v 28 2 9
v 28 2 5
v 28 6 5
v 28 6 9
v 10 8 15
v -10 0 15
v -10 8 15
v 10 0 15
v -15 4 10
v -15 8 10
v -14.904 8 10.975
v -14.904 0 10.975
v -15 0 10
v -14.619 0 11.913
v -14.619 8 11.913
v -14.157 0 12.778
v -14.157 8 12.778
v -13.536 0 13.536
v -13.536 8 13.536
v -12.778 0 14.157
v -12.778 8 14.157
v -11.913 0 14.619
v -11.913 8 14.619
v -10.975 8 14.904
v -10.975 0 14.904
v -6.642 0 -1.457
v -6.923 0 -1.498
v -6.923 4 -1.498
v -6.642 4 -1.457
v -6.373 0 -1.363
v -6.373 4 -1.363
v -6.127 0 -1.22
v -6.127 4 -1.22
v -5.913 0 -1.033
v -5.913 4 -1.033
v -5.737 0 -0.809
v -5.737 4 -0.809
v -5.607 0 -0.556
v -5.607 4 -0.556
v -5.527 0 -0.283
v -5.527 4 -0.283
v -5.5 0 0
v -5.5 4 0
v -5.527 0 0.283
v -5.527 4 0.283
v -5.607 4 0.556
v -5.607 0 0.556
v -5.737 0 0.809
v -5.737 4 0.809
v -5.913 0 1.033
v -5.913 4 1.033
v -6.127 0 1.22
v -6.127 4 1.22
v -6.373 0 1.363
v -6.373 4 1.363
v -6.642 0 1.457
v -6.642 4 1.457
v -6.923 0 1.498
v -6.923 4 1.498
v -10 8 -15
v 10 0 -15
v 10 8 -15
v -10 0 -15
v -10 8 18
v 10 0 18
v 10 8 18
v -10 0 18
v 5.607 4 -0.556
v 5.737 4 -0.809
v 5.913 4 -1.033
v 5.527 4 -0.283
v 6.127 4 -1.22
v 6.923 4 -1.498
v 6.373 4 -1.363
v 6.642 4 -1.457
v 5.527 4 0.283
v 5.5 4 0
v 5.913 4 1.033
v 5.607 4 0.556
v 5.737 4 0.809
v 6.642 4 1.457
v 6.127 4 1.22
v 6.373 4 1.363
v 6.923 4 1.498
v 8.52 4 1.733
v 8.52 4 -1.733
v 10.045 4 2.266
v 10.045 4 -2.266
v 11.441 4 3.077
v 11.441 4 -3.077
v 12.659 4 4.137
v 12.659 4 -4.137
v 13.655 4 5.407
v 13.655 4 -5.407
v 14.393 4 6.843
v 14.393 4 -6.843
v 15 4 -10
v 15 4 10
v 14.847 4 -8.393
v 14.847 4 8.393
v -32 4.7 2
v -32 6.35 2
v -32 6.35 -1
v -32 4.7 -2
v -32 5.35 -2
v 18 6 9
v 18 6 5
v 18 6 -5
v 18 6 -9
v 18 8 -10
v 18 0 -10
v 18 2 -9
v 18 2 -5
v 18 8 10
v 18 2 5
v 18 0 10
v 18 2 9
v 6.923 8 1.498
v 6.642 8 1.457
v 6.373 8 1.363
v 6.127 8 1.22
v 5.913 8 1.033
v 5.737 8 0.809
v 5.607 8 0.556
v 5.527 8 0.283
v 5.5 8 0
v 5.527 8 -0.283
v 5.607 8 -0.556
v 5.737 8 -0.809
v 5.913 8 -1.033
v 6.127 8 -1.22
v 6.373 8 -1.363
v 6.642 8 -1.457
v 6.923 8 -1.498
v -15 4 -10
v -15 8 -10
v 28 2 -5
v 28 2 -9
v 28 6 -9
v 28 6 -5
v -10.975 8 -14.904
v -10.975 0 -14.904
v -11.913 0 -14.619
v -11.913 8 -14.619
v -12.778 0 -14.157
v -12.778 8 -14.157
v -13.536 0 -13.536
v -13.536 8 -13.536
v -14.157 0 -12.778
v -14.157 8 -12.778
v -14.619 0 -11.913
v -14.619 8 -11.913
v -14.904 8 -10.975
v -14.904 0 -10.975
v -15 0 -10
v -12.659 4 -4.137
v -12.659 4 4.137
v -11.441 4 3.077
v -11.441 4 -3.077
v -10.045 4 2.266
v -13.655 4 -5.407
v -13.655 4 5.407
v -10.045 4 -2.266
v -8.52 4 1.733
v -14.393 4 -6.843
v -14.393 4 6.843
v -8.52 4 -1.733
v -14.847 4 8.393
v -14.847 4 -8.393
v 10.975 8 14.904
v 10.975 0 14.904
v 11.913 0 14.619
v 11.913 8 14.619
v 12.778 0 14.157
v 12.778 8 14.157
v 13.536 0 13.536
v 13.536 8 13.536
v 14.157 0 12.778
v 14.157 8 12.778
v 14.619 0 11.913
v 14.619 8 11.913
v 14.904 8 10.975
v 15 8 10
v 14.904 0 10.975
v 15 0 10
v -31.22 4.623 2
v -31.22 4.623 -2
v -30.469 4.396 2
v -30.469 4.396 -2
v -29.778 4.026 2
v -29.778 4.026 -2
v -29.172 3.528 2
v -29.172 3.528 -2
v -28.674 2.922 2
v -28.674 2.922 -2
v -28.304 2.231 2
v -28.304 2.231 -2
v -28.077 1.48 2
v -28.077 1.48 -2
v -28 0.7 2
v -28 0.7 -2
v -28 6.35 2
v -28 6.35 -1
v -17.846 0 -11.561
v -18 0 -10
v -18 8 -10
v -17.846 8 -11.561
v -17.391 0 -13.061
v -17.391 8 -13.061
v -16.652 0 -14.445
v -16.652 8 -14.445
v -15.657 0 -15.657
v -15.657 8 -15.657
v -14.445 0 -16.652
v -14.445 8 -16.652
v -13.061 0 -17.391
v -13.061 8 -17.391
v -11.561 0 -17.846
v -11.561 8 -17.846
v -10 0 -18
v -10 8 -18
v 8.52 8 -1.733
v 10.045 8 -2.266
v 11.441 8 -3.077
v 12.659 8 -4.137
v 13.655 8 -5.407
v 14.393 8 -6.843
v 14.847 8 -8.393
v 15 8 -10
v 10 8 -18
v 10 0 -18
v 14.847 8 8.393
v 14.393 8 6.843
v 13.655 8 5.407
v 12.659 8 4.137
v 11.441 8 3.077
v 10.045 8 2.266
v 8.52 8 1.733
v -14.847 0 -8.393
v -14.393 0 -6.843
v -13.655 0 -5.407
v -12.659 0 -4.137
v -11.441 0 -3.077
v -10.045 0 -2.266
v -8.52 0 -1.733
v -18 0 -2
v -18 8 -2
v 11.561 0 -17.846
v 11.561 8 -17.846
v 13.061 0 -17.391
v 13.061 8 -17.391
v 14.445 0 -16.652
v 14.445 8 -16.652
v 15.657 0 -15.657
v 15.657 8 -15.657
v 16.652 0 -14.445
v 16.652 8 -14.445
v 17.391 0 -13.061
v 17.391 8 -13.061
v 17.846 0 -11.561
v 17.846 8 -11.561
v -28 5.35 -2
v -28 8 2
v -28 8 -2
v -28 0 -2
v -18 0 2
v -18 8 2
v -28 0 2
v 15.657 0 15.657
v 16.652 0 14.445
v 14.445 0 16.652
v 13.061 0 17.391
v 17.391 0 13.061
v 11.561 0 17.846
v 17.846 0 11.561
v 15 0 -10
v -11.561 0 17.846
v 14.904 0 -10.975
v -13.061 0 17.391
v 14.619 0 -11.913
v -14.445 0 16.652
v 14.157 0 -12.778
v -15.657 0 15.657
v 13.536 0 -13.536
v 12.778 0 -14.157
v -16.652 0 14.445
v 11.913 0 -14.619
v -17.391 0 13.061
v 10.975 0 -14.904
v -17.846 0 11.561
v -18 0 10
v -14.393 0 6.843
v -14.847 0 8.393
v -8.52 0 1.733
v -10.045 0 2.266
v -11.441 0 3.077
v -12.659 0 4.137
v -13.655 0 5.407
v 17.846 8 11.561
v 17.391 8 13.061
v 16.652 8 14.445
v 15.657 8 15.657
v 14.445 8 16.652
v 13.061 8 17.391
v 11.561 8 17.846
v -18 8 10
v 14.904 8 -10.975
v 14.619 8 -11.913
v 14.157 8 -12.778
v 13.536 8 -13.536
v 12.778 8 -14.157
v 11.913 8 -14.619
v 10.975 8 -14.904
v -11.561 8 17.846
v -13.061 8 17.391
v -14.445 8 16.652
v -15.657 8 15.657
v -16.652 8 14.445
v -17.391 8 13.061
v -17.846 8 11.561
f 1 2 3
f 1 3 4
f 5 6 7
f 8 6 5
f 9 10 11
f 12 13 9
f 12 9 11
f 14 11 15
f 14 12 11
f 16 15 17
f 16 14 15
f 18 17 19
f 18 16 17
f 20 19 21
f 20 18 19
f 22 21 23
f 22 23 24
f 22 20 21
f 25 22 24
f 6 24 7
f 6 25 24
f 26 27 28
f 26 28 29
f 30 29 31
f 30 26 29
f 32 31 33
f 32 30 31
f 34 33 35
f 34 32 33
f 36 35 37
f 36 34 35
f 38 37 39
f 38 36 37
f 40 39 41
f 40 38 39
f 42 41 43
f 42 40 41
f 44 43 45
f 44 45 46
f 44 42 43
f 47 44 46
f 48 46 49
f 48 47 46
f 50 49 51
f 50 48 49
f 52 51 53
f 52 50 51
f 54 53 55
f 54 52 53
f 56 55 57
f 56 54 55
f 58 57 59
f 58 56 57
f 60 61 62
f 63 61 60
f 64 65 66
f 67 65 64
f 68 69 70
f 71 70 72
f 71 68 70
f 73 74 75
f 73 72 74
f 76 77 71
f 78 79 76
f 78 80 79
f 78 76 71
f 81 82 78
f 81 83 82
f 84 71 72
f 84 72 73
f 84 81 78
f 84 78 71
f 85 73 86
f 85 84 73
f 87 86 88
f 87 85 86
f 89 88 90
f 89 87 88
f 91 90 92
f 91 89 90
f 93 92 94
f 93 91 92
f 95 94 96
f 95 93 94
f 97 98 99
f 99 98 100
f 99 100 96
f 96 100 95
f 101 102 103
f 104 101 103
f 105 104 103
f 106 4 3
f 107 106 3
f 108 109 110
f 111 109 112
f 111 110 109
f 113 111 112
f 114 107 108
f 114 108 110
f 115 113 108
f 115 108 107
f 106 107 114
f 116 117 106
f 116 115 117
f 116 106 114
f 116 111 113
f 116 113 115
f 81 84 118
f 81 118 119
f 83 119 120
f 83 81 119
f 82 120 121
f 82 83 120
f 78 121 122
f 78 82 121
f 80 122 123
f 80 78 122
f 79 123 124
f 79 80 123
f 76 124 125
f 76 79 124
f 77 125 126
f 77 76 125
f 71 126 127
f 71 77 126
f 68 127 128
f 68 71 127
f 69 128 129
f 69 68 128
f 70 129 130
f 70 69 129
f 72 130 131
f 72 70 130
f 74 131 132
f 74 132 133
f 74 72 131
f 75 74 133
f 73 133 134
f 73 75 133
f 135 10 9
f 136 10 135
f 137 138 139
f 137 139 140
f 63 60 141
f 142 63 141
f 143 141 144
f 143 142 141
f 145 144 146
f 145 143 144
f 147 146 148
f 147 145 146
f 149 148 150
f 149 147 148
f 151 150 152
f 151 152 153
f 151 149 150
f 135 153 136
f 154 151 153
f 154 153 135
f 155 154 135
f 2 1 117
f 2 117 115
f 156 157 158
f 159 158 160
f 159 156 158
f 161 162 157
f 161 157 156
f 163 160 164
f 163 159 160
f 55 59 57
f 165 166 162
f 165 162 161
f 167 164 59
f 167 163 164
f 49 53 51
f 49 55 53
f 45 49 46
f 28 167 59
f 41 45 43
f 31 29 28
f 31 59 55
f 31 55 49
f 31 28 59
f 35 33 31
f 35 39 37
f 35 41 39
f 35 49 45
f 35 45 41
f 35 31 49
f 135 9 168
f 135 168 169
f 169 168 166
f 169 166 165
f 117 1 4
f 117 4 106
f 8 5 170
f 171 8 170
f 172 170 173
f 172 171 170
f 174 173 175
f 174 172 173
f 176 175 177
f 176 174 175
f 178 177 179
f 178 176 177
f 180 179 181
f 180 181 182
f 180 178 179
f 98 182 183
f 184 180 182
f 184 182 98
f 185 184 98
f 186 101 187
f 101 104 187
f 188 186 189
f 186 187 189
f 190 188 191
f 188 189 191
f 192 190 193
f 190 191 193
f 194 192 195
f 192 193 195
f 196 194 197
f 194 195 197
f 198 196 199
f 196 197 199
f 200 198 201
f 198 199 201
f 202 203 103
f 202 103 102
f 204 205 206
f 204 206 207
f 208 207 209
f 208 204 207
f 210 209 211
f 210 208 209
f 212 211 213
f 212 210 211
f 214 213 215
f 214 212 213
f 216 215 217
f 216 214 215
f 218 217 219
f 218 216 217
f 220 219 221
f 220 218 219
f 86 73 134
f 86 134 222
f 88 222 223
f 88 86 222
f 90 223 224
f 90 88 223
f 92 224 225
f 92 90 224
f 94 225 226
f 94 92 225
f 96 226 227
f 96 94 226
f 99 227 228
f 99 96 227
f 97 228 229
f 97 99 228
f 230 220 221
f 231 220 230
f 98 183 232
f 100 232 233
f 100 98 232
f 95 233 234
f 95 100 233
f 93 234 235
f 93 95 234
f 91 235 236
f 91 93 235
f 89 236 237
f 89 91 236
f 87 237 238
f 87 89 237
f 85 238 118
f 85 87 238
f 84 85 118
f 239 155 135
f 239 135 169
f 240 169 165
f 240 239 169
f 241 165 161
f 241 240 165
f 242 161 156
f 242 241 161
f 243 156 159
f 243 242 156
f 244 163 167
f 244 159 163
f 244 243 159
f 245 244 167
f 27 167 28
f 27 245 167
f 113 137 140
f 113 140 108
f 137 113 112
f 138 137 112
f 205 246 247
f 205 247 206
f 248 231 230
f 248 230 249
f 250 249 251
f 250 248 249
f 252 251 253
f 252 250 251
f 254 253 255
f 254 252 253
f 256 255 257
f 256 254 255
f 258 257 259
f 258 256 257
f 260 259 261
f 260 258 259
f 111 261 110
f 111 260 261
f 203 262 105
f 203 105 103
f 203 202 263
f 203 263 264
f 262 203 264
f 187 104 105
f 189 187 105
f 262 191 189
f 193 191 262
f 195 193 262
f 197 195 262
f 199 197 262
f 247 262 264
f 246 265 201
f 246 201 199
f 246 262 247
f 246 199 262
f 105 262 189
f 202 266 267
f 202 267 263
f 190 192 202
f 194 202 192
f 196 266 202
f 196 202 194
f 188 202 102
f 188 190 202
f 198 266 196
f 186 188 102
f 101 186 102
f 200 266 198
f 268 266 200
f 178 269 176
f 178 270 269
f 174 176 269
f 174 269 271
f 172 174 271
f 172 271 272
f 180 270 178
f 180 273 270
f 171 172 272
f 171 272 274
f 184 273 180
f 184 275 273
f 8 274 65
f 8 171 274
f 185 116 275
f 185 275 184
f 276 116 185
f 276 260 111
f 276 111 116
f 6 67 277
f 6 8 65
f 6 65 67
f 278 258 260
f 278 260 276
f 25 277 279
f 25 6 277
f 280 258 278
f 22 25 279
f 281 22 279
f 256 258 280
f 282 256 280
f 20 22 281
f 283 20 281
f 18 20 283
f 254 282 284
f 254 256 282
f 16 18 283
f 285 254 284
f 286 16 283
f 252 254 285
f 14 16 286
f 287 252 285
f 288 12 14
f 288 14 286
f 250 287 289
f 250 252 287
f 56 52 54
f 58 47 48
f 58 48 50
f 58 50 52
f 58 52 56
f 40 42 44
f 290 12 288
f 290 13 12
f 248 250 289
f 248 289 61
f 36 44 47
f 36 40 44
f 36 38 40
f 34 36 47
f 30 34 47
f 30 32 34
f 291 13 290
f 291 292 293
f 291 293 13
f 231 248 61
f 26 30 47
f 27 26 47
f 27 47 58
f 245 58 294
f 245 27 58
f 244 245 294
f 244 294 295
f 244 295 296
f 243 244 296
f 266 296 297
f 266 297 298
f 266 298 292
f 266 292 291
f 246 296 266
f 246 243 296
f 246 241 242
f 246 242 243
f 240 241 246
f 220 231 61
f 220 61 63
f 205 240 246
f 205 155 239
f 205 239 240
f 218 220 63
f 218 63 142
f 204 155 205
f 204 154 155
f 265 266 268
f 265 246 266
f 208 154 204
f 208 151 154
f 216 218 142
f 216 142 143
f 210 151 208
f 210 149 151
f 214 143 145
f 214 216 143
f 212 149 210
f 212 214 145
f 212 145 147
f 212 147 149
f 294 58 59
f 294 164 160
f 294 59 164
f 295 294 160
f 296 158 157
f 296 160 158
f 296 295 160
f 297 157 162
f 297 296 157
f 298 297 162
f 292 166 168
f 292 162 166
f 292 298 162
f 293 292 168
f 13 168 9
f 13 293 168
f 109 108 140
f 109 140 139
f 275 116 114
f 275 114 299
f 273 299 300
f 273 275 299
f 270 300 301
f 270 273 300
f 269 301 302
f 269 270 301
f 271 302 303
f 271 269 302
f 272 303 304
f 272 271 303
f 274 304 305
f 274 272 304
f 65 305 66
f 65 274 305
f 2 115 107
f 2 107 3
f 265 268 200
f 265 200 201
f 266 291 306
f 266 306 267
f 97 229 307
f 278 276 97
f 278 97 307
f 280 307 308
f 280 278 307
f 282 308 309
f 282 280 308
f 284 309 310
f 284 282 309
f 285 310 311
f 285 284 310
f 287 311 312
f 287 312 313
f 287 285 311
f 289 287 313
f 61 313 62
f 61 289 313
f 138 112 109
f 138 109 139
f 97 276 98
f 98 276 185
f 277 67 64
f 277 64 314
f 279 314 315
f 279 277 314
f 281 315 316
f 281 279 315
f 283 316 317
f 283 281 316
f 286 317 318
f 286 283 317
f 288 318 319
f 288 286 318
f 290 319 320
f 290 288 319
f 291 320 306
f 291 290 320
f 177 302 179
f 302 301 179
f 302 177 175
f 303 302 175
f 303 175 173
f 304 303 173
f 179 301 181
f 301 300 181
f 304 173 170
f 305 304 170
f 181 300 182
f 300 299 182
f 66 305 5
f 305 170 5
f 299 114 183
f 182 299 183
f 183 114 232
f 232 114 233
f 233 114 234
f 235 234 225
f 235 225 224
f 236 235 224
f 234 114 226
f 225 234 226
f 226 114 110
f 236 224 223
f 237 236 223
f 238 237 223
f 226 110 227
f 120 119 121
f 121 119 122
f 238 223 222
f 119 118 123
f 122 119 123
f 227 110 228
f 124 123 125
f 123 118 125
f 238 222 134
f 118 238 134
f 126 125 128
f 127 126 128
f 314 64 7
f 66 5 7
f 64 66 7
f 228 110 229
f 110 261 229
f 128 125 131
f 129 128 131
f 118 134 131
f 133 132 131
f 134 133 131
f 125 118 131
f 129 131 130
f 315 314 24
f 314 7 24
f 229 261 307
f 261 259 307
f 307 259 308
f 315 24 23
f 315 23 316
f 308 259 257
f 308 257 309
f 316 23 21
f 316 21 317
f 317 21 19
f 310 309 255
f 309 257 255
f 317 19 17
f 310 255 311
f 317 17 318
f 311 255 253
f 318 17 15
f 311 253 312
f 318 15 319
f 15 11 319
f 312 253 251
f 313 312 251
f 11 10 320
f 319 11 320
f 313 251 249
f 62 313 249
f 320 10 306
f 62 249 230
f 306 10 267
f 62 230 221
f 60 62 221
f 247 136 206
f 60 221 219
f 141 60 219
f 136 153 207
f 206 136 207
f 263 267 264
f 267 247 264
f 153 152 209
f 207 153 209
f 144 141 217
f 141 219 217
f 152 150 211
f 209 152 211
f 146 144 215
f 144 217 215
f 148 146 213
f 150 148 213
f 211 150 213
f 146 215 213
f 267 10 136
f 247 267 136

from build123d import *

# Parameters (mm, degrees)
BOSS_EXTRUDE1_DEPTH = 8
BOSS_EXTRUDE2_DEPTH = 4
SKETCH3_W           = 18
SKETCH3_H           = 2
CUT_EXTRUDE1_DEPTH  = 10
FILLET1_R           = 4
SKETCH4_W           = 9.5
SKETCH4_H           = 20
CUT_EXTRUDE2_DEPTH  = 4
SKETCH5_W           = 9.5
SKETCH5_H           = 20
CUT_EXTRUDE3_DEPTH  = 4


with BuildPart() as part:
    # Sketch1 → Boss-Extrude1 (new body)
    with BuildSketch(Plane(origin=(0, 0, 0), x_dir=(1, 0, 0), z_dir=(0, 1, 0))):
        with BuildLine():
            Line((-18, -10), (-18, -2))
            Line((-18, -2), (-28, -2))
            Line((-28, -2), (-28, 2))
            Line((-28, 2), (-18, 2))
            Line((-18, 2), (-18, 10))
            ThreePointArc((-18, 10), (-15.656854249, 15.656854249), (-10, 18))
            Line((-10, 18), (10, 18))
            ThreePointArc((10, 18), (15.656854249, 15.656854249), (18, 10))
            Line((18, 10), (18, 9))
            Line((18, 9), (28, 9))
            Line((28, 9), (28, 5))
            Line((28, 5), (18, 5))
            Line((18, 5), (18, -5))
            Line((18, -5), (28, -5))
            Line((28, -5), (28, -9))
            Line((28, -9), (18, -9))
            Line((18, -9), (18, -10))
            ThreePointArc((18, -10), (15.656854249, -15.656854249), (10, -18))
            Line((10, -18), (-10, -18))
            ThreePointArc((-10, -18), (-15.656854249, -15.656854249), (-18, -10))
        make_face()
        with BuildLine():
            Line((-10, -15), (10, -15))
            ThreePointArc((10, -15), (13.535533906, -13.535533906), (15, -10))
            ThreePointArc((15, -10), (12.658876757, -4.136567081), (6.923127464, -1.498028909))
            ThreePointArc((6.923127464, -1.498028909), (5.5, 0), (6.923127464, 1.498028909))
            ThreePointArc((6.923127464, 1.498028909), (12.658876757, 4.136567081), (15, 10))
            ThreePointArc((15, 10), (13.535533906, 13.535533906), (10, 15))
            Line((10, 15), (-10, 15))
            ThreePointArc((-10, 15), (-13.535533906, 13.535533906), (-15, 10))
            ThreePointArc((-15, 10), (-12.658876757, 4.136567081), (-6.923127464, 1.498028909))
            ThreePointArc((-6.923127464, 1.498028909), (-5.5, 0), (-6.923127464, -1.498028909))
            ThreePointArc((-6.923127464, -1.498028909), (-12.658876757, -4.136567081), (-15, -10))
            ThreePointArc((-15, -10), (-13.535533906, -13.535533906), (-10, -15))
        make_face(mode=Mode.SUBTRACT)
    extrude(amount=BOSS_EXTRUDE1_DEPTH)

    # Sketch2 → Boss-Extrude2 (add)
    with BuildSketch(Plane.ZY.offset(28)):
        Polygon((-1, 6.35), (2, 6.35), (2, 4.7), (-2, 4.7), (-2, 5.35), align=None)
    extrude(amount=BOSS_EXTRUDE2_DEPTH)

    # Sketch3 → Cut-Extrude1 (cut)
    with BuildSketch(Plane(origin=(28, 0, 0), x_dir=(0, 0, -1), z_dir=(1, 0, 0))):
        with Locations((0, 1)):
            Rectangle(SKETCH3_W, SKETCH3_H)
        with Locations((0, 7)):
            Rectangle(SKETCH3_W, SKETCH3_H)
    extrude(amount=-CUT_EXTRUDE1_DEPTH, mode=Mode.SUBTRACT)

    # Fillet1
    fillet1_edges = [part.edges().sort_by_distance(p)[0] for p in [
        (-28, 4.7, 0),
    ]]
    fillet(fillet1_edges, radius=FILLET1_R - 0.0001)  # a hair under: the kernel refuses the full size

    # Sketch4 → Cut-Extrude2 (cut)
    with BuildSketch(Plane.XZ):
        with Locations((10.25, 0)):
            Rectangle(SKETCH4_W, SKETCH4_H)
    extrude(amount=-CUT_EXTRUDE2_DEPTH, mode=Mode.SUBTRACT)

    # Sketch5 → Cut-Extrude3 (cut)
    with BuildSketch(Plane(origin=(0, 8, 0), x_dir=(1, 0, 0), z_dir=(0, 1, 0))):
        with Locations((-10.25, 0)):
            Rectangle(SKETCH5_W, SKETCH5_H)
    extrude(amount=-CUT_EXTRUDE3_DEPTH, mode=Mode.SUBTRACT)


solid = part.part
